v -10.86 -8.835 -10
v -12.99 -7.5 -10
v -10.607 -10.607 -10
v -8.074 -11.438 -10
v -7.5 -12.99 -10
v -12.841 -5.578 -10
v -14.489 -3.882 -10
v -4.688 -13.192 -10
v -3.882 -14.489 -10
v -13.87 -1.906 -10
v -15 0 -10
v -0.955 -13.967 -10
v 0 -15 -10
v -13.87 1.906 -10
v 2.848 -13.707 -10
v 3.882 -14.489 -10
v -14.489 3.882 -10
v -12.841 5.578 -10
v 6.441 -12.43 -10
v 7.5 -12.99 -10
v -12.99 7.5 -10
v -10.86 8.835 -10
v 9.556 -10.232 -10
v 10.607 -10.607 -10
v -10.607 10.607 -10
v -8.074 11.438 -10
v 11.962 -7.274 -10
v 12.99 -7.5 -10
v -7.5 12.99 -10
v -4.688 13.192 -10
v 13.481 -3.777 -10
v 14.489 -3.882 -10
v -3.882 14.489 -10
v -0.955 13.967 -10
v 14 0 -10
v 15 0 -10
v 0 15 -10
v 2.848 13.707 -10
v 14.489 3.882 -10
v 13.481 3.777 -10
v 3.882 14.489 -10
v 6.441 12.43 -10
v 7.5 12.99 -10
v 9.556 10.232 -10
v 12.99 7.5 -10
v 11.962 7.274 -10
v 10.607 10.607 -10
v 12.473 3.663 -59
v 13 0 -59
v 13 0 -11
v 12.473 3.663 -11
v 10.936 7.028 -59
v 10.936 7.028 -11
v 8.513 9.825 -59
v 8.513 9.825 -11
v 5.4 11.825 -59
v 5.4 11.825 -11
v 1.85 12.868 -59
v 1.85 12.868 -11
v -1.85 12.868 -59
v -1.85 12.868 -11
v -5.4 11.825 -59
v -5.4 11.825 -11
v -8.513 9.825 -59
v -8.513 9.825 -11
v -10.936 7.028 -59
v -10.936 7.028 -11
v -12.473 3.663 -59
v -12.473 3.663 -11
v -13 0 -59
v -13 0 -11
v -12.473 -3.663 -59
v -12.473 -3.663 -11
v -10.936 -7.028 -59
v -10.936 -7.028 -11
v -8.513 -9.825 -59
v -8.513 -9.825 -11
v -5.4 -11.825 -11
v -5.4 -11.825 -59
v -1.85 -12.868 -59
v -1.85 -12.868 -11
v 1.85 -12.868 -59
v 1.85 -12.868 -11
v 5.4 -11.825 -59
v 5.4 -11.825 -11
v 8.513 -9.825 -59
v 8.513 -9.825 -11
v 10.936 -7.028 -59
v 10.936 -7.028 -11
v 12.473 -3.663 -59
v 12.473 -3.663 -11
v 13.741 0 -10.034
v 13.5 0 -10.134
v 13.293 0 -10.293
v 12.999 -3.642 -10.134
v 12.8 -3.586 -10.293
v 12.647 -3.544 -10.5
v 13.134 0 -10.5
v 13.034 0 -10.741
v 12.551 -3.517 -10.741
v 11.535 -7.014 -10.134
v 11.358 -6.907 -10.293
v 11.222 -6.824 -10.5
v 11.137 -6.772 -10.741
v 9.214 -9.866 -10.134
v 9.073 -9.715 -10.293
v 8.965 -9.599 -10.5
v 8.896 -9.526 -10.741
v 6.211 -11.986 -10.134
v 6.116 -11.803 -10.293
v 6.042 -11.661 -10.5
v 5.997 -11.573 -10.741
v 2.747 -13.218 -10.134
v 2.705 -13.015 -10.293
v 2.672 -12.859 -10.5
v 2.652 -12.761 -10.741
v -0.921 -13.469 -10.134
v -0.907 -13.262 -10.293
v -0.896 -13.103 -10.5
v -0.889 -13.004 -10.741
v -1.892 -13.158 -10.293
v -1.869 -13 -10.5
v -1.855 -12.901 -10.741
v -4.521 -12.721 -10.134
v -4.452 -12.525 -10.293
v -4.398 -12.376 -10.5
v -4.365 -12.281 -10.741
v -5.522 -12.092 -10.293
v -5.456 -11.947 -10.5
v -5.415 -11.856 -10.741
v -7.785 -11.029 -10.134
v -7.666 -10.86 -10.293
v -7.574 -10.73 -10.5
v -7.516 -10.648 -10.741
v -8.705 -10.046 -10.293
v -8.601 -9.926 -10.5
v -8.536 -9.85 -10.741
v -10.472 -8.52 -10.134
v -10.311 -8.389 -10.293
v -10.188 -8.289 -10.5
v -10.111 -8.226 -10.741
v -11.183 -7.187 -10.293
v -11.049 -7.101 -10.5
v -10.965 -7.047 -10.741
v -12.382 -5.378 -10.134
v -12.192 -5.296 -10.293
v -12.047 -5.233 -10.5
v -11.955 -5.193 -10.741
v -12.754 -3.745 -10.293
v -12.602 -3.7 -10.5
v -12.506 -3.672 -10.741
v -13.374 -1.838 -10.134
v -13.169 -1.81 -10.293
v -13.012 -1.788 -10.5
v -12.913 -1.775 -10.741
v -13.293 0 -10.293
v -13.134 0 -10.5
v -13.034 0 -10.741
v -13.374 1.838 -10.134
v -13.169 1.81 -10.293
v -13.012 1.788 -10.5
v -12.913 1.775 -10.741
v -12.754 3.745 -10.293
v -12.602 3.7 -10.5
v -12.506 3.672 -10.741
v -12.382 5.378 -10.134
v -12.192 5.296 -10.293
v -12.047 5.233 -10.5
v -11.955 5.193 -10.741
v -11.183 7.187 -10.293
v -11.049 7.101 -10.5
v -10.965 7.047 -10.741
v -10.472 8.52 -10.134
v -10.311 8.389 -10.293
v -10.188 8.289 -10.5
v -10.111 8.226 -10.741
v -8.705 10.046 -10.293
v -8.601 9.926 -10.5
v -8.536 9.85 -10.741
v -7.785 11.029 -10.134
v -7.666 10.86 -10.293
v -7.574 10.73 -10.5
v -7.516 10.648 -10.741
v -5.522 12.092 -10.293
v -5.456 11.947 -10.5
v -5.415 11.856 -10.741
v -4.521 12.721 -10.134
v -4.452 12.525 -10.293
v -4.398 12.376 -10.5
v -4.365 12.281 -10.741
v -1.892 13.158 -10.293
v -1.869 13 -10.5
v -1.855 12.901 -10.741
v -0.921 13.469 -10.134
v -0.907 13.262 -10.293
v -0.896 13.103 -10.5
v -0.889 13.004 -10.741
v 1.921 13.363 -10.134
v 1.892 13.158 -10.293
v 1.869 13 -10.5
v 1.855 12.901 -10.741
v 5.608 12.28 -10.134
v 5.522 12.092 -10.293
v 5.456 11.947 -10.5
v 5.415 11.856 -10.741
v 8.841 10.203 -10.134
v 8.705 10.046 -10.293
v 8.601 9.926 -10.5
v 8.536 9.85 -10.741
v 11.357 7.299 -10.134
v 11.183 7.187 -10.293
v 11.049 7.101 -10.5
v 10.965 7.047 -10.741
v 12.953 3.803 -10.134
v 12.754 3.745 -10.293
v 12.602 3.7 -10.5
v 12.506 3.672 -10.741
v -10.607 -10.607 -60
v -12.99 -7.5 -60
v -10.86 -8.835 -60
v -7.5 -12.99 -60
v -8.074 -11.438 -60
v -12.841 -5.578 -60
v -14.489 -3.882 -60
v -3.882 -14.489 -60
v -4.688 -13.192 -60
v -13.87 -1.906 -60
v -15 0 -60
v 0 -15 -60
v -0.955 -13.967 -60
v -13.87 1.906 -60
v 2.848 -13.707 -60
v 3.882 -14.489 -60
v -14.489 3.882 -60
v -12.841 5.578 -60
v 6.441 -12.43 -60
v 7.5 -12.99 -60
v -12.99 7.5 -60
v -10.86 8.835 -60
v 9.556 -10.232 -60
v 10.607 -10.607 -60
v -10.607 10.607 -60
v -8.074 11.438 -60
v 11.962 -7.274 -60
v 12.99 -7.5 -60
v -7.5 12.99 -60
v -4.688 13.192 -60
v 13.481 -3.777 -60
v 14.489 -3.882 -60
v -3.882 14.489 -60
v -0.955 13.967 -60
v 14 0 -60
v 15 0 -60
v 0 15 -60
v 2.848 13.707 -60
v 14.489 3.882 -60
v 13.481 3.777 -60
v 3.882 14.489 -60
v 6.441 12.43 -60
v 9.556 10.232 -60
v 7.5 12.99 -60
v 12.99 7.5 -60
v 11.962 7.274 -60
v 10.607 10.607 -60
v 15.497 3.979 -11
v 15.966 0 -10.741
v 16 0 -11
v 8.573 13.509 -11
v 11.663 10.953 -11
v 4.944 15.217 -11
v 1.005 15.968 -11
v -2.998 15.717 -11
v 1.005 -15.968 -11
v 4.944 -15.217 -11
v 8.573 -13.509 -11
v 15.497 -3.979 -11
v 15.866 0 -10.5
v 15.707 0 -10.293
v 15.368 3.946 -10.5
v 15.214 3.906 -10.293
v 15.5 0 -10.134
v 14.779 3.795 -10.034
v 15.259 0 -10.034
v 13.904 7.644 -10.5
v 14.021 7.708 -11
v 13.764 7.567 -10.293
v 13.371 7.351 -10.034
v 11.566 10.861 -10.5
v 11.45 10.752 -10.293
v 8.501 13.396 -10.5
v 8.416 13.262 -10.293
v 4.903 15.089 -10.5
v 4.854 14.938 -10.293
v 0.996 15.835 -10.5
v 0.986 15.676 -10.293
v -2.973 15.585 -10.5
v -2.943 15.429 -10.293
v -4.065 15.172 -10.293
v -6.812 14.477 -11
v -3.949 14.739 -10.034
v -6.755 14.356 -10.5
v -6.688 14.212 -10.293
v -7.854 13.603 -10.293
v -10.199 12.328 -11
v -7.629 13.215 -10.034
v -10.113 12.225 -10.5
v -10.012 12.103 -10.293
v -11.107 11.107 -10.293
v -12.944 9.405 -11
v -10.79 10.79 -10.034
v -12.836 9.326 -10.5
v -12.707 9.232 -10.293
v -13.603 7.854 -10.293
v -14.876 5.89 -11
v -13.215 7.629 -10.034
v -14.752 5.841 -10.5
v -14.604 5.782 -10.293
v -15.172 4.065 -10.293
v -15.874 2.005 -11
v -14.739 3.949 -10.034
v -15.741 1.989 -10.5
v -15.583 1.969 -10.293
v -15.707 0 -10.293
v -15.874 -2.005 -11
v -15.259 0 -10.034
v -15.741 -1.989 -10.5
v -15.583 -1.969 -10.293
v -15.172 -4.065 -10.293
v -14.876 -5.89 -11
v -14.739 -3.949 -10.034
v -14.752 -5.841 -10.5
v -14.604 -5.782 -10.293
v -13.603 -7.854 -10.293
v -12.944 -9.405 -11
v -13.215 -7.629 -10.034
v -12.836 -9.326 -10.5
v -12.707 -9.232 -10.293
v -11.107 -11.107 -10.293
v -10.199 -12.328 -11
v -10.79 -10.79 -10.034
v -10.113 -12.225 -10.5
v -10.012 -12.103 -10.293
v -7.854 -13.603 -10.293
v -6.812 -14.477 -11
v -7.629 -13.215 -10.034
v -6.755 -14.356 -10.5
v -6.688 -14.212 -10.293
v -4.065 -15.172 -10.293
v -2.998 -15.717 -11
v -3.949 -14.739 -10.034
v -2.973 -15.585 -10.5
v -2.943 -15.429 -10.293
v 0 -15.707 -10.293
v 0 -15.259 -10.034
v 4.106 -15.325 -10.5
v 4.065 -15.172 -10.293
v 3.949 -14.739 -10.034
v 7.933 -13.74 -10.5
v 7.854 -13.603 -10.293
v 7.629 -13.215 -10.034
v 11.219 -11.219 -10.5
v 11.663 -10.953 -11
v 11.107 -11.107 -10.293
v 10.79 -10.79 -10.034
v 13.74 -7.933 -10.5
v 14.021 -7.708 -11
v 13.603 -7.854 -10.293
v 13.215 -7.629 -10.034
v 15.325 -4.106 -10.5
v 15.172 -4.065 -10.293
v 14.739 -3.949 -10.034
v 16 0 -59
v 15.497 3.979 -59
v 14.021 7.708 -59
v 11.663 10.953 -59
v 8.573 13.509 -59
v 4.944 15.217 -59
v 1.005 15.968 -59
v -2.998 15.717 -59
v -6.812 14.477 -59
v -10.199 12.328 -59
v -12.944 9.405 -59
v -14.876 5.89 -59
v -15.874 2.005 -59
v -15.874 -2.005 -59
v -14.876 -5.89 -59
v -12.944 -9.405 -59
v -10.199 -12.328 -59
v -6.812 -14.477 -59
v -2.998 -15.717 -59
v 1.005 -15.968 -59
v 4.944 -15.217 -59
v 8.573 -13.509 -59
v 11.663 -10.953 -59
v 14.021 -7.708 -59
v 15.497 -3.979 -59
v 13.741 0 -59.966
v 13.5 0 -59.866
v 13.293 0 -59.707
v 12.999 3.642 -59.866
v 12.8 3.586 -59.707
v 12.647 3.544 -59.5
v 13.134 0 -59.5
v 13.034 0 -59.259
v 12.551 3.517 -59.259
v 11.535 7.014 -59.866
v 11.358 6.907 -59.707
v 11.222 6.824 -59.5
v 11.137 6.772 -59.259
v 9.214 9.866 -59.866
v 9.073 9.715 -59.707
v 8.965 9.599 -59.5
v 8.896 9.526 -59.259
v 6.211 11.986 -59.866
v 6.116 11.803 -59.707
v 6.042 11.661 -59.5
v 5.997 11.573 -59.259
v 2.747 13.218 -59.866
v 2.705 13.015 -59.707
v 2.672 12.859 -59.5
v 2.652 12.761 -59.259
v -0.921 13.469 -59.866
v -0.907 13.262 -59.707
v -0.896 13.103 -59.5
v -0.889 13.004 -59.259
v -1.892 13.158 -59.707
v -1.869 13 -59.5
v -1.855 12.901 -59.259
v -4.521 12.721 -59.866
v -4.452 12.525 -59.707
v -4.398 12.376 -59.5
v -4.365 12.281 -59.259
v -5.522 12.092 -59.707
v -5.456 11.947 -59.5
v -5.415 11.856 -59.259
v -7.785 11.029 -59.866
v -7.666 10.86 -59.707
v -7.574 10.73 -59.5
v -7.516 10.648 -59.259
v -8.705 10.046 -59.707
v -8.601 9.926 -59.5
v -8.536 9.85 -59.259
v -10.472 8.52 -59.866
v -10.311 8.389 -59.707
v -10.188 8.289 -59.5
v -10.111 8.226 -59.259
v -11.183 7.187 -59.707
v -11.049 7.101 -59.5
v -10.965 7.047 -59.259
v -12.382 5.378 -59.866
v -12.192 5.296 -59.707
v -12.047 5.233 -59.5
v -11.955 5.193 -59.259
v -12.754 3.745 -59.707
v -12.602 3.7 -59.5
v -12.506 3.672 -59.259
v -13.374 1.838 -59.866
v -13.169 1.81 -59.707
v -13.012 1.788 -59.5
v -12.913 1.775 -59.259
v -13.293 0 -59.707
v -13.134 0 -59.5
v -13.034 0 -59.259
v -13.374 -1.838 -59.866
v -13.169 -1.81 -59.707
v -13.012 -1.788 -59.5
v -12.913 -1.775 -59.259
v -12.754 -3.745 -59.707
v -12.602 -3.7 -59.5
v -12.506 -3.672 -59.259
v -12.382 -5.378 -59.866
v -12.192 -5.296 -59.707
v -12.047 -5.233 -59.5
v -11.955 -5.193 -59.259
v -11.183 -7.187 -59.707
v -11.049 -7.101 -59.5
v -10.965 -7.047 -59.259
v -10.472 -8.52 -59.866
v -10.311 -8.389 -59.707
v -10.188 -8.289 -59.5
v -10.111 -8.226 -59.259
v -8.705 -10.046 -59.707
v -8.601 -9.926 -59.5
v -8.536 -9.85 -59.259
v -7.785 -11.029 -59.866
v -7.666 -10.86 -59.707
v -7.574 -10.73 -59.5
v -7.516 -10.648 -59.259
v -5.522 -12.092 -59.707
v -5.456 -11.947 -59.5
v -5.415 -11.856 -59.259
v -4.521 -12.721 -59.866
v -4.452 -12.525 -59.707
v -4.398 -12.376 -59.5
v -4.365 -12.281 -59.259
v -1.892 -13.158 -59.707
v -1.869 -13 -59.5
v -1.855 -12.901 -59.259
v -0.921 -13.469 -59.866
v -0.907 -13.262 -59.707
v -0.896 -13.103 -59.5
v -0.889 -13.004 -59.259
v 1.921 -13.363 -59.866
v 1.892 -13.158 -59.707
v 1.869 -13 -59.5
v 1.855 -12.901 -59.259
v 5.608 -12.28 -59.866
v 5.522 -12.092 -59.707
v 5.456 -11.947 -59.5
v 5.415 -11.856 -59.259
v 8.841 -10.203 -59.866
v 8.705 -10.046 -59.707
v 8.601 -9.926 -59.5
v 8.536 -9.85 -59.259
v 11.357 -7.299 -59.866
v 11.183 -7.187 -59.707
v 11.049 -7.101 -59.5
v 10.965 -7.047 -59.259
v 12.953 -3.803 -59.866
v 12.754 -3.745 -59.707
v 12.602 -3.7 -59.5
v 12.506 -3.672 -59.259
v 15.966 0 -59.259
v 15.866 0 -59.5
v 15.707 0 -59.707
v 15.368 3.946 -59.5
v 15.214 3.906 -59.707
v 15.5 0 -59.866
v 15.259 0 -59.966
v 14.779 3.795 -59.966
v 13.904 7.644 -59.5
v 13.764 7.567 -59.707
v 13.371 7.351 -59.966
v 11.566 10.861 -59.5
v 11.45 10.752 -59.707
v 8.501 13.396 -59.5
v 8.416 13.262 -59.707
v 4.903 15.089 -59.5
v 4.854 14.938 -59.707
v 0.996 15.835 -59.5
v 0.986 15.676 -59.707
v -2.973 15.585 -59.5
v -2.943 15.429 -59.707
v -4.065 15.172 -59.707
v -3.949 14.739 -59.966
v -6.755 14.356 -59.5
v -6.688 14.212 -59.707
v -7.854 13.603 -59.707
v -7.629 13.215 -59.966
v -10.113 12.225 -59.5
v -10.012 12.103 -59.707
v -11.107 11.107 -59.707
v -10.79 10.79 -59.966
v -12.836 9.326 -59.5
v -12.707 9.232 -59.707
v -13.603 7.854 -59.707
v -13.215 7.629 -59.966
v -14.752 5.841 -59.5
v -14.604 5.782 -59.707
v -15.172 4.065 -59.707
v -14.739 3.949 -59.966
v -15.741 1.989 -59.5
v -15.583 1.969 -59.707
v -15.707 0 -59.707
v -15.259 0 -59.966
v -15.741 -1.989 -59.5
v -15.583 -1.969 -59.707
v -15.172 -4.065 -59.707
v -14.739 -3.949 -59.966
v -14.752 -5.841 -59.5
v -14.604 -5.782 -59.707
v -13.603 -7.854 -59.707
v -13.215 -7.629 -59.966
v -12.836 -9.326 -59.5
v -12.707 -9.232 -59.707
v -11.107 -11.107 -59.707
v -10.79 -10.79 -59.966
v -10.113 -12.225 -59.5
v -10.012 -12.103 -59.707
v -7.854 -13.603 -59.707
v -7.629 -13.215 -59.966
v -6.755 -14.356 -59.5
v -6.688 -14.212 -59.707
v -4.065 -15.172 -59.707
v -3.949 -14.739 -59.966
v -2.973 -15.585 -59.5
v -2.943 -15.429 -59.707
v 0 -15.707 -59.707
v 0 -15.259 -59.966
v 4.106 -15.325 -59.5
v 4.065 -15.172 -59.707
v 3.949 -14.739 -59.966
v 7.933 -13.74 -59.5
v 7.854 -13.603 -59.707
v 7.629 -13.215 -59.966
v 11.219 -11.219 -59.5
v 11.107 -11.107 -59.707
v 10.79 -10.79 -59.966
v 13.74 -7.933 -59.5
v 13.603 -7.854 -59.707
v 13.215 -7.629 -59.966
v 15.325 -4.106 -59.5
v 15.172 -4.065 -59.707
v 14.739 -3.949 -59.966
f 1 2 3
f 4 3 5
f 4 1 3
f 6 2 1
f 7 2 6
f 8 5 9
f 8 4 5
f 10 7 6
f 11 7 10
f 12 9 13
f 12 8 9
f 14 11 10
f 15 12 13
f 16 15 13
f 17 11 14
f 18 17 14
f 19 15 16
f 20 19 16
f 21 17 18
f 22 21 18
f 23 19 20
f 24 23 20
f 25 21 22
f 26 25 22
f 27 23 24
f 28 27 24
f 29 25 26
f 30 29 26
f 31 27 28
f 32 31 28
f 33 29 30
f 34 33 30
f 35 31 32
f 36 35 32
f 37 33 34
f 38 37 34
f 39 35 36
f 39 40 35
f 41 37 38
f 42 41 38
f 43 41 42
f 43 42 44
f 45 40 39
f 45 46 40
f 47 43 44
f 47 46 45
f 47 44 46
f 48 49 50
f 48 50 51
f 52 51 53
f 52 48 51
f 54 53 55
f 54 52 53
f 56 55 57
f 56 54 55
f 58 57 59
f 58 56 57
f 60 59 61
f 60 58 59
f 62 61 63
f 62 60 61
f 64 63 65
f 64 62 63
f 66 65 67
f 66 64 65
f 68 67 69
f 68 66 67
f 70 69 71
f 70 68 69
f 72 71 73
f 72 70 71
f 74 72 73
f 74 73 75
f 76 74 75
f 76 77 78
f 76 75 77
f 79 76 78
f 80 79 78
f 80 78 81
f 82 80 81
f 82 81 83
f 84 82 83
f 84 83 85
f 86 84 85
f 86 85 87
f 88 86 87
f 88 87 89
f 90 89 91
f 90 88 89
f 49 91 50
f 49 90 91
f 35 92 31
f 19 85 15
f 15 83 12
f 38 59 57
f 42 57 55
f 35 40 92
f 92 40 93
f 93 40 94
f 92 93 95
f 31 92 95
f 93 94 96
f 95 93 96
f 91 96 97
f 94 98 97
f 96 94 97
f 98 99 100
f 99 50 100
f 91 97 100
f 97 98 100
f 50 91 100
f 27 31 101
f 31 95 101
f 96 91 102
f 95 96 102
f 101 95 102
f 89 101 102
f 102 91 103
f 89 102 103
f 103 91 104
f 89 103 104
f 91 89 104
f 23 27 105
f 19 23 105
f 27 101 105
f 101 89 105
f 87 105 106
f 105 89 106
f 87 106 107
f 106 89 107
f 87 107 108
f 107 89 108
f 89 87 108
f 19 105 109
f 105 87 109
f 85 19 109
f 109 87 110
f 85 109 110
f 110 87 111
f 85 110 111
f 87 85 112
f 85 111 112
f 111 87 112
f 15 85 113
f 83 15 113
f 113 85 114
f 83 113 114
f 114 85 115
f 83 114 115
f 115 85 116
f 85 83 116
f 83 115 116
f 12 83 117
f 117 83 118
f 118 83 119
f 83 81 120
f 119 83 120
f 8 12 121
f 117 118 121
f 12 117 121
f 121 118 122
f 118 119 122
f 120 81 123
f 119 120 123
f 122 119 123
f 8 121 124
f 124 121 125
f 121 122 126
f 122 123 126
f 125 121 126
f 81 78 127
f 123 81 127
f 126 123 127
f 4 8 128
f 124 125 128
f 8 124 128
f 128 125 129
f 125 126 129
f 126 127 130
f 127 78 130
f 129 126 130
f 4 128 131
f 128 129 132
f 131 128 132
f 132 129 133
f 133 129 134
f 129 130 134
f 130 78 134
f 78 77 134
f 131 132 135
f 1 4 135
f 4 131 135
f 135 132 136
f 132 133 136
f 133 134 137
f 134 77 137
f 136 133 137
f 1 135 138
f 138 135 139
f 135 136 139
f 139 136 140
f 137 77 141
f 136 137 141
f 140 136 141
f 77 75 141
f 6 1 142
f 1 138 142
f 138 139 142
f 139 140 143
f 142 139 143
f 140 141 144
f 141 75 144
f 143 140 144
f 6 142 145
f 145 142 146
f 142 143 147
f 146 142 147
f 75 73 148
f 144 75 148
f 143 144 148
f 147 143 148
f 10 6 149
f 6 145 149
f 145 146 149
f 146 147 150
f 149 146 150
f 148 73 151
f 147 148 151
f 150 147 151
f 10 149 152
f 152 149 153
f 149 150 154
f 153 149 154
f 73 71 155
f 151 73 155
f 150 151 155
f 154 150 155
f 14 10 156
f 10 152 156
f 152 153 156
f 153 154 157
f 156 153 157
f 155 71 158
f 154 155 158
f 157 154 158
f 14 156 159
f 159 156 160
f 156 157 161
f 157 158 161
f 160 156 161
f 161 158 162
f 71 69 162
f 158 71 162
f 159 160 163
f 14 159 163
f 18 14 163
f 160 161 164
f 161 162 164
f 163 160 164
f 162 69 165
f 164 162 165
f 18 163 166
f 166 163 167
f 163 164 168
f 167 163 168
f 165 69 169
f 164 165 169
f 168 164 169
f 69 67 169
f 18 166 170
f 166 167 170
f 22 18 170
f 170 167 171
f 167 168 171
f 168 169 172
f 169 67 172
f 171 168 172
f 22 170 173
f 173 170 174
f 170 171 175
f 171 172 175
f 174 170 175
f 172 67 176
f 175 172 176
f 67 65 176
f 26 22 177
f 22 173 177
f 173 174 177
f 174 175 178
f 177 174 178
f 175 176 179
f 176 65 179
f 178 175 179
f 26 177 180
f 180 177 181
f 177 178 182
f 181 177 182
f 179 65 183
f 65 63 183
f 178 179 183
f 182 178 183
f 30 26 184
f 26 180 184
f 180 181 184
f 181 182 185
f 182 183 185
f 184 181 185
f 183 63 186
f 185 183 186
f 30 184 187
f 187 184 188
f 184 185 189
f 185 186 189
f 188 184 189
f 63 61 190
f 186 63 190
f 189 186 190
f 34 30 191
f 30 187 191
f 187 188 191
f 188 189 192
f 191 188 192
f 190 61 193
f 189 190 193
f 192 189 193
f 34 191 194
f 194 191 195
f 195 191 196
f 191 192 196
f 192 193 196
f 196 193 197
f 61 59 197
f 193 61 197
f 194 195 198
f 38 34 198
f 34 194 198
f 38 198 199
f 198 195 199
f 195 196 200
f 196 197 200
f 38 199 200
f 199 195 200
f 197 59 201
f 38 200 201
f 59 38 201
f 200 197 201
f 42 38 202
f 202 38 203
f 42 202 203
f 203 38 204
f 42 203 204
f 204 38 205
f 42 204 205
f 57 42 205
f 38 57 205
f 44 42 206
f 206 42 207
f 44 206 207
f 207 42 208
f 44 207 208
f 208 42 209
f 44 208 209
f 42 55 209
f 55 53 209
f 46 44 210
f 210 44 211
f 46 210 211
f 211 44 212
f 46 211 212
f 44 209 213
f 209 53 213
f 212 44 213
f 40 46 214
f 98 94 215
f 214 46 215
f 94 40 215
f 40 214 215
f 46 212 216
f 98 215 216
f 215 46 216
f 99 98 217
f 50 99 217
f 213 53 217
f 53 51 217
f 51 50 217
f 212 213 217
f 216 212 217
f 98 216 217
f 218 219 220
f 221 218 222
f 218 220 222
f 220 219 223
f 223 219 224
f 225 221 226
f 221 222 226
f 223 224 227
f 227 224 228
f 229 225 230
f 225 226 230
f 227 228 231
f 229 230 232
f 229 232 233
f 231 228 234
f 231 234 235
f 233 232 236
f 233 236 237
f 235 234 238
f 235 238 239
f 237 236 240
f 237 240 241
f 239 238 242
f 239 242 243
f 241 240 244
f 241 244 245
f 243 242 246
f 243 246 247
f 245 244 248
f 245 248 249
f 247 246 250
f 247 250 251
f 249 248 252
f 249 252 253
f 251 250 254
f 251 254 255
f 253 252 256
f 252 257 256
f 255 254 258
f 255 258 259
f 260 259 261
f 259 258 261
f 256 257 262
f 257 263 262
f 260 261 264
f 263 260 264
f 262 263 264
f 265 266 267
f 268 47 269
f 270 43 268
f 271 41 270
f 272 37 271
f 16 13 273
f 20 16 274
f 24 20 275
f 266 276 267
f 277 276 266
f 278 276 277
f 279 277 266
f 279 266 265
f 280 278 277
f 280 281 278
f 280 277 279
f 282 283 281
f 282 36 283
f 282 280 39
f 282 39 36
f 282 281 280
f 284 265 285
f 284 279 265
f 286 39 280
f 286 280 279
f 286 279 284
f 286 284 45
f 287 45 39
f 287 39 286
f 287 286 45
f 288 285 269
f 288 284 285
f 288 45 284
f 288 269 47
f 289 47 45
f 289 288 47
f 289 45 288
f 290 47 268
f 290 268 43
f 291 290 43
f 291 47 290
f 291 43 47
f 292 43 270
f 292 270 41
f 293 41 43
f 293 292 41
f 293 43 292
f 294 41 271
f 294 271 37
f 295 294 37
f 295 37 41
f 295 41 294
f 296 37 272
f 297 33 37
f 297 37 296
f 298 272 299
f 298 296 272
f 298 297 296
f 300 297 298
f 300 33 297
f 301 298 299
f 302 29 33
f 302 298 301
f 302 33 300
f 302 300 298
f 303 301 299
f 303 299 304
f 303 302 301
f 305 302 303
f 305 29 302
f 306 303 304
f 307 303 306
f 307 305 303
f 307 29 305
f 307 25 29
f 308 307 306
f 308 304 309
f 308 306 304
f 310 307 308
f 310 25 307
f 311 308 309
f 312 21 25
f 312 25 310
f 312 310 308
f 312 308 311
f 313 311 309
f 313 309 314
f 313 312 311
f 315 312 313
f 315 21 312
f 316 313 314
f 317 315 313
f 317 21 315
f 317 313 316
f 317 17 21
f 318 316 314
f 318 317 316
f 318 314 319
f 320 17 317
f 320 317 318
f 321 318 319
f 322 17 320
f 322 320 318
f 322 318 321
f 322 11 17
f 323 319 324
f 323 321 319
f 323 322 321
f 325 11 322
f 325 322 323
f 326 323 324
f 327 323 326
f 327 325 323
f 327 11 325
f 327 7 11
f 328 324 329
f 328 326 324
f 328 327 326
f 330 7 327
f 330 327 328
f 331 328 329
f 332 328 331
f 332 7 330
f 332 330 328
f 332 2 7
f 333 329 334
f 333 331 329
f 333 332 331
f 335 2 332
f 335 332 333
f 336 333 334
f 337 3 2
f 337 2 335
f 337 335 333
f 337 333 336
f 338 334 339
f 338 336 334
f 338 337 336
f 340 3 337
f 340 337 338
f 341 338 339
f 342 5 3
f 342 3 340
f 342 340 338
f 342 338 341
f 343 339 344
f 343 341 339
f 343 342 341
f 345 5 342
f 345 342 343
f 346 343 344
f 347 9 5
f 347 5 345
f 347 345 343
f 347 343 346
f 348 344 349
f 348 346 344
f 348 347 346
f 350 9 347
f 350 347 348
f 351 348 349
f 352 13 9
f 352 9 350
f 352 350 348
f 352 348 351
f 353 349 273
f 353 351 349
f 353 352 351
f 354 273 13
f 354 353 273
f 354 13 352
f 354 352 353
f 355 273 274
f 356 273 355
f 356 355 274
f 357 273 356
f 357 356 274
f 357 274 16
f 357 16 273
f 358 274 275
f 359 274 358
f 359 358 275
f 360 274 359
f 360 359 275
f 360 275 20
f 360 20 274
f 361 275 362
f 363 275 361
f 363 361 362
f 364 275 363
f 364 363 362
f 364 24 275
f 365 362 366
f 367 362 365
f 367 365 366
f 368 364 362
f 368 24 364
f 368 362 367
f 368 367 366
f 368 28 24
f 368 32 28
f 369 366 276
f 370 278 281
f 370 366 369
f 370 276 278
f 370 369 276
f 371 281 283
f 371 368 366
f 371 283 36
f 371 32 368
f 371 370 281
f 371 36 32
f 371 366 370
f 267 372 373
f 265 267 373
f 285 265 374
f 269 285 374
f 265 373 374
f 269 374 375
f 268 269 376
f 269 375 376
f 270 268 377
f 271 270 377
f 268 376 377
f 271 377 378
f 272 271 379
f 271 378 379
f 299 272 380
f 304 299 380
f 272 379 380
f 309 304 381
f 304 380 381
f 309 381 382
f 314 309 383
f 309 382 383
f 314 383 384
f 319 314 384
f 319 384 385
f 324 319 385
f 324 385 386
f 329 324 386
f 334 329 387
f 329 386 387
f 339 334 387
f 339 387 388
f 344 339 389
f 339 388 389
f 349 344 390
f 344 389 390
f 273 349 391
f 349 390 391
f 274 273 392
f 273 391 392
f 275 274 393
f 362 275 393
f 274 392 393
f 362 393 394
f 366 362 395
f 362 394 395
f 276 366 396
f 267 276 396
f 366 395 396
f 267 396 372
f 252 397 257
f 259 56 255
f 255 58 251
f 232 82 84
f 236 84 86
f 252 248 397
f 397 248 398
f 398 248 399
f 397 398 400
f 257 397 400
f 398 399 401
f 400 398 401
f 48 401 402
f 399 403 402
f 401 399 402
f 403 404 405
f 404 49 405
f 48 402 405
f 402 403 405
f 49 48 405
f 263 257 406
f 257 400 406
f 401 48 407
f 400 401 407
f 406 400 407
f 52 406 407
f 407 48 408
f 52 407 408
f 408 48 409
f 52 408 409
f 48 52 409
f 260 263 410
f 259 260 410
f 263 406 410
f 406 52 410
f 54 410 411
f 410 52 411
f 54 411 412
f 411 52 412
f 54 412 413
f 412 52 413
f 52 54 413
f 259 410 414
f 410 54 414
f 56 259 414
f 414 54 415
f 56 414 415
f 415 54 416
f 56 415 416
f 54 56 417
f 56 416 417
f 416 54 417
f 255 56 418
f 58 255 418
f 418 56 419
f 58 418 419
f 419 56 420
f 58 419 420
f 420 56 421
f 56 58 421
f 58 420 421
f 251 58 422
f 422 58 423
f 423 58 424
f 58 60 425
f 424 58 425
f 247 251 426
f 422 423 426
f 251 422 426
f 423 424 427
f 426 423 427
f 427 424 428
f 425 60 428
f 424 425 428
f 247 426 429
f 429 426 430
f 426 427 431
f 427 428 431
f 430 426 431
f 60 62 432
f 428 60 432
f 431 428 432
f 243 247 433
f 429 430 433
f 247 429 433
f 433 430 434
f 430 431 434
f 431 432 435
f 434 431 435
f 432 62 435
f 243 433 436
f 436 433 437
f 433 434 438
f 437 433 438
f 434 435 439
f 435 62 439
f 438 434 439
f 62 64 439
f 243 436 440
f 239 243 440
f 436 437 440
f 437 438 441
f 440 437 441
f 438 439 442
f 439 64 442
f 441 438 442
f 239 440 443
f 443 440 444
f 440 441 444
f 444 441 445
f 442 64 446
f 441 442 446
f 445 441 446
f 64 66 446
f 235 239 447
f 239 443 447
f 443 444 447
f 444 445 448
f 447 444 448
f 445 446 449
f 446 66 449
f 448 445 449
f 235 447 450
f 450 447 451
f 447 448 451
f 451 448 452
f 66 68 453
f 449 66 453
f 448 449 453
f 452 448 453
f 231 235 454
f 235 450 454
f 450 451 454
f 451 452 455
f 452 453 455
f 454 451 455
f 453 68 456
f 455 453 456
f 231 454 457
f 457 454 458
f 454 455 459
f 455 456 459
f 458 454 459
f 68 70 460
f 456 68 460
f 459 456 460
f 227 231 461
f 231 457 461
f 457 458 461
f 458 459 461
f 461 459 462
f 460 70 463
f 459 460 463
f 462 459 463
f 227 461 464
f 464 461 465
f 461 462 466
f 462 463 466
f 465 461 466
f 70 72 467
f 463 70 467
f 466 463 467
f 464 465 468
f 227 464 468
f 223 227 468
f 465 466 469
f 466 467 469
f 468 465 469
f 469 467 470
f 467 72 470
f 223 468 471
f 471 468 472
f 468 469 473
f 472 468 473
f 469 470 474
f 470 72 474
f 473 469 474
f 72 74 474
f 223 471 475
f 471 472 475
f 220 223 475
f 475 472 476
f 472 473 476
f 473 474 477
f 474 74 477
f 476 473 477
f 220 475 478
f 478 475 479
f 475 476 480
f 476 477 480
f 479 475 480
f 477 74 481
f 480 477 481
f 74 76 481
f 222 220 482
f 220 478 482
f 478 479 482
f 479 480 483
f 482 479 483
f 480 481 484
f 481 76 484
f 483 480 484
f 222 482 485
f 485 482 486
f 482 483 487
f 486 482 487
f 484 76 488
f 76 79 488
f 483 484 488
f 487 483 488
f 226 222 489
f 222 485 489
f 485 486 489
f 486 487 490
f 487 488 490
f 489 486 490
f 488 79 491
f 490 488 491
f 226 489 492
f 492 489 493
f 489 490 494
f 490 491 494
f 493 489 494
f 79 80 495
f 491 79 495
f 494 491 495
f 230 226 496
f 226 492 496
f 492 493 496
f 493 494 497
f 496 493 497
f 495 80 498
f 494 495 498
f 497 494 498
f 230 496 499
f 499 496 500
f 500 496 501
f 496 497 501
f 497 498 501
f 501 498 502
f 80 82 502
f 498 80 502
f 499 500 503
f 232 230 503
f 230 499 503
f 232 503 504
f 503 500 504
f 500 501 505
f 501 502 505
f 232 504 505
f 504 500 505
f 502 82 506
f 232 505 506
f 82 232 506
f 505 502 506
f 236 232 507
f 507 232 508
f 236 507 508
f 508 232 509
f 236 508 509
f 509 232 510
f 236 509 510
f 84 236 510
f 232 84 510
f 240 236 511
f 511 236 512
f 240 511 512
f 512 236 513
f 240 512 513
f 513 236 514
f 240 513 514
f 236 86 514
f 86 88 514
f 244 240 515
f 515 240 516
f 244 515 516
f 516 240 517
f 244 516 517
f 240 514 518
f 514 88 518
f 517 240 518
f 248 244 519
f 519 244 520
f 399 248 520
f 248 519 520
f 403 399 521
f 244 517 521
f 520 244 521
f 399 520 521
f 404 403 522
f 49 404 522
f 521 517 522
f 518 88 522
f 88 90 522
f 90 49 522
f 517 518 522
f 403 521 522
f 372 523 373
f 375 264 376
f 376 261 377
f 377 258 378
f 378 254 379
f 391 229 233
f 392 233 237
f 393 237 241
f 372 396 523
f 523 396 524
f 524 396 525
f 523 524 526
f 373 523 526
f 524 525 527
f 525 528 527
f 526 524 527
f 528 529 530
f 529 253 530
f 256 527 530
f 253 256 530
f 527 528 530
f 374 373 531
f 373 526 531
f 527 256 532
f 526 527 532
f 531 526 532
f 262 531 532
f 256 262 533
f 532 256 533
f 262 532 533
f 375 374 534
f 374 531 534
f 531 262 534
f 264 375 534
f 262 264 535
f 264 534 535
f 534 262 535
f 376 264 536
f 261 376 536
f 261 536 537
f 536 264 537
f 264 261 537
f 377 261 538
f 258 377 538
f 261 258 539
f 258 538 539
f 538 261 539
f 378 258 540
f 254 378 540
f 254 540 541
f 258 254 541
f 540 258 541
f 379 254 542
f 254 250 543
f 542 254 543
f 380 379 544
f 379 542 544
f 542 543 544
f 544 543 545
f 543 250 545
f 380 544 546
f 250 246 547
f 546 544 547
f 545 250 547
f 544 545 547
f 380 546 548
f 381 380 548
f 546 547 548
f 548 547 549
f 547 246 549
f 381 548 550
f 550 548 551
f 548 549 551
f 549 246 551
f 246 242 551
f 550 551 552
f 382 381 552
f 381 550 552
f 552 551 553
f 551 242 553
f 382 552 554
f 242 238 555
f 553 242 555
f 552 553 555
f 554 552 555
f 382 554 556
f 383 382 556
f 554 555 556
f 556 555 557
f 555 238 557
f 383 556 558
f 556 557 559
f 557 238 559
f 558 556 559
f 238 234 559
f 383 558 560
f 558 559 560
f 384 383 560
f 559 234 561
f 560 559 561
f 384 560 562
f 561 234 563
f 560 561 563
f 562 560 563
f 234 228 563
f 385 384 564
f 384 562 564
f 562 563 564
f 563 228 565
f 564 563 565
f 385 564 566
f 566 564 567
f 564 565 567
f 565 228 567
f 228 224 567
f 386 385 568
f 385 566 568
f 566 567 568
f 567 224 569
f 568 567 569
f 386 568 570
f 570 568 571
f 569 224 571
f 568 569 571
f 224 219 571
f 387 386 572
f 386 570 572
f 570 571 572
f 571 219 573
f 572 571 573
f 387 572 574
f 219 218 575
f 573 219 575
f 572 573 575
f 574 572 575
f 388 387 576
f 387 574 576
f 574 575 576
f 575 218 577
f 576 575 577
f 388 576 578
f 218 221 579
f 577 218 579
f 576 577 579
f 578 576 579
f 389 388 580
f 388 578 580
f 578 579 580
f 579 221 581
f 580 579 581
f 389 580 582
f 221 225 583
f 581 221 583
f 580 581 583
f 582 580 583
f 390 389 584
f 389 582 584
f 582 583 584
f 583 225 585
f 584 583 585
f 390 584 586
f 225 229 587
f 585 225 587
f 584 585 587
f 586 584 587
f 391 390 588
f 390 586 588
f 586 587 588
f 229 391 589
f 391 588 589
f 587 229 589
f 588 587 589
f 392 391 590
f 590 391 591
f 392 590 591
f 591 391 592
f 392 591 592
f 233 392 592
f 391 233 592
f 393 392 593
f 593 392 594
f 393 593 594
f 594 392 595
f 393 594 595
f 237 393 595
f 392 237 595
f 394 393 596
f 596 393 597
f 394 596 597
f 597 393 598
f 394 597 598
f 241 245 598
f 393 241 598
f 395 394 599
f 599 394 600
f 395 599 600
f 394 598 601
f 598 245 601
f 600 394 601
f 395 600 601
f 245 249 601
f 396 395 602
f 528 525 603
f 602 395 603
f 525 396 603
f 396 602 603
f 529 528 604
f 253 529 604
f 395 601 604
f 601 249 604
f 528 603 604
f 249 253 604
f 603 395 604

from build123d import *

# Parameters (mm, degrees)
CYLINDER001_R     = 13
CYLINDER001_DEPTH = 120
CYLINDER_R        = 16
CYLINDER_DEPTH    = 50
FILLET_R          = 1


with BuildPart() as indre_hul:
    # Cylinder001 → Cylinder001 (new body)
    with BuildSketch(Plane.XY.offset(-60)):
        Circle(CYLINDER001_R)
    extrude(amount=CYLINDER001_DEPTH)


with BuildPart() as fillet_body:
    # Cylinder → Cylinder (new body)
    with BuildSketch(Plane.XY.offset(-60)):
        Circle(CYLINDER_R)
    extrude(amount=CYLINDER_DEPTH)

    # Cut: cut Indre hul
    add(indre_hul.part, mode=Mode.SUBTRACT)

    # Fillet
    fillet_edges = [fillet_body.edges().sort_by_distance(p)[0] for p in [
        (-16, 0, -10),
        (-16, 0, -60),
        (-13, 0, -10),
        (-13, 0, -60),
    ]]
    fillet(fillet_edges, radius=FILLET_R)


solid = fillet_body.part
